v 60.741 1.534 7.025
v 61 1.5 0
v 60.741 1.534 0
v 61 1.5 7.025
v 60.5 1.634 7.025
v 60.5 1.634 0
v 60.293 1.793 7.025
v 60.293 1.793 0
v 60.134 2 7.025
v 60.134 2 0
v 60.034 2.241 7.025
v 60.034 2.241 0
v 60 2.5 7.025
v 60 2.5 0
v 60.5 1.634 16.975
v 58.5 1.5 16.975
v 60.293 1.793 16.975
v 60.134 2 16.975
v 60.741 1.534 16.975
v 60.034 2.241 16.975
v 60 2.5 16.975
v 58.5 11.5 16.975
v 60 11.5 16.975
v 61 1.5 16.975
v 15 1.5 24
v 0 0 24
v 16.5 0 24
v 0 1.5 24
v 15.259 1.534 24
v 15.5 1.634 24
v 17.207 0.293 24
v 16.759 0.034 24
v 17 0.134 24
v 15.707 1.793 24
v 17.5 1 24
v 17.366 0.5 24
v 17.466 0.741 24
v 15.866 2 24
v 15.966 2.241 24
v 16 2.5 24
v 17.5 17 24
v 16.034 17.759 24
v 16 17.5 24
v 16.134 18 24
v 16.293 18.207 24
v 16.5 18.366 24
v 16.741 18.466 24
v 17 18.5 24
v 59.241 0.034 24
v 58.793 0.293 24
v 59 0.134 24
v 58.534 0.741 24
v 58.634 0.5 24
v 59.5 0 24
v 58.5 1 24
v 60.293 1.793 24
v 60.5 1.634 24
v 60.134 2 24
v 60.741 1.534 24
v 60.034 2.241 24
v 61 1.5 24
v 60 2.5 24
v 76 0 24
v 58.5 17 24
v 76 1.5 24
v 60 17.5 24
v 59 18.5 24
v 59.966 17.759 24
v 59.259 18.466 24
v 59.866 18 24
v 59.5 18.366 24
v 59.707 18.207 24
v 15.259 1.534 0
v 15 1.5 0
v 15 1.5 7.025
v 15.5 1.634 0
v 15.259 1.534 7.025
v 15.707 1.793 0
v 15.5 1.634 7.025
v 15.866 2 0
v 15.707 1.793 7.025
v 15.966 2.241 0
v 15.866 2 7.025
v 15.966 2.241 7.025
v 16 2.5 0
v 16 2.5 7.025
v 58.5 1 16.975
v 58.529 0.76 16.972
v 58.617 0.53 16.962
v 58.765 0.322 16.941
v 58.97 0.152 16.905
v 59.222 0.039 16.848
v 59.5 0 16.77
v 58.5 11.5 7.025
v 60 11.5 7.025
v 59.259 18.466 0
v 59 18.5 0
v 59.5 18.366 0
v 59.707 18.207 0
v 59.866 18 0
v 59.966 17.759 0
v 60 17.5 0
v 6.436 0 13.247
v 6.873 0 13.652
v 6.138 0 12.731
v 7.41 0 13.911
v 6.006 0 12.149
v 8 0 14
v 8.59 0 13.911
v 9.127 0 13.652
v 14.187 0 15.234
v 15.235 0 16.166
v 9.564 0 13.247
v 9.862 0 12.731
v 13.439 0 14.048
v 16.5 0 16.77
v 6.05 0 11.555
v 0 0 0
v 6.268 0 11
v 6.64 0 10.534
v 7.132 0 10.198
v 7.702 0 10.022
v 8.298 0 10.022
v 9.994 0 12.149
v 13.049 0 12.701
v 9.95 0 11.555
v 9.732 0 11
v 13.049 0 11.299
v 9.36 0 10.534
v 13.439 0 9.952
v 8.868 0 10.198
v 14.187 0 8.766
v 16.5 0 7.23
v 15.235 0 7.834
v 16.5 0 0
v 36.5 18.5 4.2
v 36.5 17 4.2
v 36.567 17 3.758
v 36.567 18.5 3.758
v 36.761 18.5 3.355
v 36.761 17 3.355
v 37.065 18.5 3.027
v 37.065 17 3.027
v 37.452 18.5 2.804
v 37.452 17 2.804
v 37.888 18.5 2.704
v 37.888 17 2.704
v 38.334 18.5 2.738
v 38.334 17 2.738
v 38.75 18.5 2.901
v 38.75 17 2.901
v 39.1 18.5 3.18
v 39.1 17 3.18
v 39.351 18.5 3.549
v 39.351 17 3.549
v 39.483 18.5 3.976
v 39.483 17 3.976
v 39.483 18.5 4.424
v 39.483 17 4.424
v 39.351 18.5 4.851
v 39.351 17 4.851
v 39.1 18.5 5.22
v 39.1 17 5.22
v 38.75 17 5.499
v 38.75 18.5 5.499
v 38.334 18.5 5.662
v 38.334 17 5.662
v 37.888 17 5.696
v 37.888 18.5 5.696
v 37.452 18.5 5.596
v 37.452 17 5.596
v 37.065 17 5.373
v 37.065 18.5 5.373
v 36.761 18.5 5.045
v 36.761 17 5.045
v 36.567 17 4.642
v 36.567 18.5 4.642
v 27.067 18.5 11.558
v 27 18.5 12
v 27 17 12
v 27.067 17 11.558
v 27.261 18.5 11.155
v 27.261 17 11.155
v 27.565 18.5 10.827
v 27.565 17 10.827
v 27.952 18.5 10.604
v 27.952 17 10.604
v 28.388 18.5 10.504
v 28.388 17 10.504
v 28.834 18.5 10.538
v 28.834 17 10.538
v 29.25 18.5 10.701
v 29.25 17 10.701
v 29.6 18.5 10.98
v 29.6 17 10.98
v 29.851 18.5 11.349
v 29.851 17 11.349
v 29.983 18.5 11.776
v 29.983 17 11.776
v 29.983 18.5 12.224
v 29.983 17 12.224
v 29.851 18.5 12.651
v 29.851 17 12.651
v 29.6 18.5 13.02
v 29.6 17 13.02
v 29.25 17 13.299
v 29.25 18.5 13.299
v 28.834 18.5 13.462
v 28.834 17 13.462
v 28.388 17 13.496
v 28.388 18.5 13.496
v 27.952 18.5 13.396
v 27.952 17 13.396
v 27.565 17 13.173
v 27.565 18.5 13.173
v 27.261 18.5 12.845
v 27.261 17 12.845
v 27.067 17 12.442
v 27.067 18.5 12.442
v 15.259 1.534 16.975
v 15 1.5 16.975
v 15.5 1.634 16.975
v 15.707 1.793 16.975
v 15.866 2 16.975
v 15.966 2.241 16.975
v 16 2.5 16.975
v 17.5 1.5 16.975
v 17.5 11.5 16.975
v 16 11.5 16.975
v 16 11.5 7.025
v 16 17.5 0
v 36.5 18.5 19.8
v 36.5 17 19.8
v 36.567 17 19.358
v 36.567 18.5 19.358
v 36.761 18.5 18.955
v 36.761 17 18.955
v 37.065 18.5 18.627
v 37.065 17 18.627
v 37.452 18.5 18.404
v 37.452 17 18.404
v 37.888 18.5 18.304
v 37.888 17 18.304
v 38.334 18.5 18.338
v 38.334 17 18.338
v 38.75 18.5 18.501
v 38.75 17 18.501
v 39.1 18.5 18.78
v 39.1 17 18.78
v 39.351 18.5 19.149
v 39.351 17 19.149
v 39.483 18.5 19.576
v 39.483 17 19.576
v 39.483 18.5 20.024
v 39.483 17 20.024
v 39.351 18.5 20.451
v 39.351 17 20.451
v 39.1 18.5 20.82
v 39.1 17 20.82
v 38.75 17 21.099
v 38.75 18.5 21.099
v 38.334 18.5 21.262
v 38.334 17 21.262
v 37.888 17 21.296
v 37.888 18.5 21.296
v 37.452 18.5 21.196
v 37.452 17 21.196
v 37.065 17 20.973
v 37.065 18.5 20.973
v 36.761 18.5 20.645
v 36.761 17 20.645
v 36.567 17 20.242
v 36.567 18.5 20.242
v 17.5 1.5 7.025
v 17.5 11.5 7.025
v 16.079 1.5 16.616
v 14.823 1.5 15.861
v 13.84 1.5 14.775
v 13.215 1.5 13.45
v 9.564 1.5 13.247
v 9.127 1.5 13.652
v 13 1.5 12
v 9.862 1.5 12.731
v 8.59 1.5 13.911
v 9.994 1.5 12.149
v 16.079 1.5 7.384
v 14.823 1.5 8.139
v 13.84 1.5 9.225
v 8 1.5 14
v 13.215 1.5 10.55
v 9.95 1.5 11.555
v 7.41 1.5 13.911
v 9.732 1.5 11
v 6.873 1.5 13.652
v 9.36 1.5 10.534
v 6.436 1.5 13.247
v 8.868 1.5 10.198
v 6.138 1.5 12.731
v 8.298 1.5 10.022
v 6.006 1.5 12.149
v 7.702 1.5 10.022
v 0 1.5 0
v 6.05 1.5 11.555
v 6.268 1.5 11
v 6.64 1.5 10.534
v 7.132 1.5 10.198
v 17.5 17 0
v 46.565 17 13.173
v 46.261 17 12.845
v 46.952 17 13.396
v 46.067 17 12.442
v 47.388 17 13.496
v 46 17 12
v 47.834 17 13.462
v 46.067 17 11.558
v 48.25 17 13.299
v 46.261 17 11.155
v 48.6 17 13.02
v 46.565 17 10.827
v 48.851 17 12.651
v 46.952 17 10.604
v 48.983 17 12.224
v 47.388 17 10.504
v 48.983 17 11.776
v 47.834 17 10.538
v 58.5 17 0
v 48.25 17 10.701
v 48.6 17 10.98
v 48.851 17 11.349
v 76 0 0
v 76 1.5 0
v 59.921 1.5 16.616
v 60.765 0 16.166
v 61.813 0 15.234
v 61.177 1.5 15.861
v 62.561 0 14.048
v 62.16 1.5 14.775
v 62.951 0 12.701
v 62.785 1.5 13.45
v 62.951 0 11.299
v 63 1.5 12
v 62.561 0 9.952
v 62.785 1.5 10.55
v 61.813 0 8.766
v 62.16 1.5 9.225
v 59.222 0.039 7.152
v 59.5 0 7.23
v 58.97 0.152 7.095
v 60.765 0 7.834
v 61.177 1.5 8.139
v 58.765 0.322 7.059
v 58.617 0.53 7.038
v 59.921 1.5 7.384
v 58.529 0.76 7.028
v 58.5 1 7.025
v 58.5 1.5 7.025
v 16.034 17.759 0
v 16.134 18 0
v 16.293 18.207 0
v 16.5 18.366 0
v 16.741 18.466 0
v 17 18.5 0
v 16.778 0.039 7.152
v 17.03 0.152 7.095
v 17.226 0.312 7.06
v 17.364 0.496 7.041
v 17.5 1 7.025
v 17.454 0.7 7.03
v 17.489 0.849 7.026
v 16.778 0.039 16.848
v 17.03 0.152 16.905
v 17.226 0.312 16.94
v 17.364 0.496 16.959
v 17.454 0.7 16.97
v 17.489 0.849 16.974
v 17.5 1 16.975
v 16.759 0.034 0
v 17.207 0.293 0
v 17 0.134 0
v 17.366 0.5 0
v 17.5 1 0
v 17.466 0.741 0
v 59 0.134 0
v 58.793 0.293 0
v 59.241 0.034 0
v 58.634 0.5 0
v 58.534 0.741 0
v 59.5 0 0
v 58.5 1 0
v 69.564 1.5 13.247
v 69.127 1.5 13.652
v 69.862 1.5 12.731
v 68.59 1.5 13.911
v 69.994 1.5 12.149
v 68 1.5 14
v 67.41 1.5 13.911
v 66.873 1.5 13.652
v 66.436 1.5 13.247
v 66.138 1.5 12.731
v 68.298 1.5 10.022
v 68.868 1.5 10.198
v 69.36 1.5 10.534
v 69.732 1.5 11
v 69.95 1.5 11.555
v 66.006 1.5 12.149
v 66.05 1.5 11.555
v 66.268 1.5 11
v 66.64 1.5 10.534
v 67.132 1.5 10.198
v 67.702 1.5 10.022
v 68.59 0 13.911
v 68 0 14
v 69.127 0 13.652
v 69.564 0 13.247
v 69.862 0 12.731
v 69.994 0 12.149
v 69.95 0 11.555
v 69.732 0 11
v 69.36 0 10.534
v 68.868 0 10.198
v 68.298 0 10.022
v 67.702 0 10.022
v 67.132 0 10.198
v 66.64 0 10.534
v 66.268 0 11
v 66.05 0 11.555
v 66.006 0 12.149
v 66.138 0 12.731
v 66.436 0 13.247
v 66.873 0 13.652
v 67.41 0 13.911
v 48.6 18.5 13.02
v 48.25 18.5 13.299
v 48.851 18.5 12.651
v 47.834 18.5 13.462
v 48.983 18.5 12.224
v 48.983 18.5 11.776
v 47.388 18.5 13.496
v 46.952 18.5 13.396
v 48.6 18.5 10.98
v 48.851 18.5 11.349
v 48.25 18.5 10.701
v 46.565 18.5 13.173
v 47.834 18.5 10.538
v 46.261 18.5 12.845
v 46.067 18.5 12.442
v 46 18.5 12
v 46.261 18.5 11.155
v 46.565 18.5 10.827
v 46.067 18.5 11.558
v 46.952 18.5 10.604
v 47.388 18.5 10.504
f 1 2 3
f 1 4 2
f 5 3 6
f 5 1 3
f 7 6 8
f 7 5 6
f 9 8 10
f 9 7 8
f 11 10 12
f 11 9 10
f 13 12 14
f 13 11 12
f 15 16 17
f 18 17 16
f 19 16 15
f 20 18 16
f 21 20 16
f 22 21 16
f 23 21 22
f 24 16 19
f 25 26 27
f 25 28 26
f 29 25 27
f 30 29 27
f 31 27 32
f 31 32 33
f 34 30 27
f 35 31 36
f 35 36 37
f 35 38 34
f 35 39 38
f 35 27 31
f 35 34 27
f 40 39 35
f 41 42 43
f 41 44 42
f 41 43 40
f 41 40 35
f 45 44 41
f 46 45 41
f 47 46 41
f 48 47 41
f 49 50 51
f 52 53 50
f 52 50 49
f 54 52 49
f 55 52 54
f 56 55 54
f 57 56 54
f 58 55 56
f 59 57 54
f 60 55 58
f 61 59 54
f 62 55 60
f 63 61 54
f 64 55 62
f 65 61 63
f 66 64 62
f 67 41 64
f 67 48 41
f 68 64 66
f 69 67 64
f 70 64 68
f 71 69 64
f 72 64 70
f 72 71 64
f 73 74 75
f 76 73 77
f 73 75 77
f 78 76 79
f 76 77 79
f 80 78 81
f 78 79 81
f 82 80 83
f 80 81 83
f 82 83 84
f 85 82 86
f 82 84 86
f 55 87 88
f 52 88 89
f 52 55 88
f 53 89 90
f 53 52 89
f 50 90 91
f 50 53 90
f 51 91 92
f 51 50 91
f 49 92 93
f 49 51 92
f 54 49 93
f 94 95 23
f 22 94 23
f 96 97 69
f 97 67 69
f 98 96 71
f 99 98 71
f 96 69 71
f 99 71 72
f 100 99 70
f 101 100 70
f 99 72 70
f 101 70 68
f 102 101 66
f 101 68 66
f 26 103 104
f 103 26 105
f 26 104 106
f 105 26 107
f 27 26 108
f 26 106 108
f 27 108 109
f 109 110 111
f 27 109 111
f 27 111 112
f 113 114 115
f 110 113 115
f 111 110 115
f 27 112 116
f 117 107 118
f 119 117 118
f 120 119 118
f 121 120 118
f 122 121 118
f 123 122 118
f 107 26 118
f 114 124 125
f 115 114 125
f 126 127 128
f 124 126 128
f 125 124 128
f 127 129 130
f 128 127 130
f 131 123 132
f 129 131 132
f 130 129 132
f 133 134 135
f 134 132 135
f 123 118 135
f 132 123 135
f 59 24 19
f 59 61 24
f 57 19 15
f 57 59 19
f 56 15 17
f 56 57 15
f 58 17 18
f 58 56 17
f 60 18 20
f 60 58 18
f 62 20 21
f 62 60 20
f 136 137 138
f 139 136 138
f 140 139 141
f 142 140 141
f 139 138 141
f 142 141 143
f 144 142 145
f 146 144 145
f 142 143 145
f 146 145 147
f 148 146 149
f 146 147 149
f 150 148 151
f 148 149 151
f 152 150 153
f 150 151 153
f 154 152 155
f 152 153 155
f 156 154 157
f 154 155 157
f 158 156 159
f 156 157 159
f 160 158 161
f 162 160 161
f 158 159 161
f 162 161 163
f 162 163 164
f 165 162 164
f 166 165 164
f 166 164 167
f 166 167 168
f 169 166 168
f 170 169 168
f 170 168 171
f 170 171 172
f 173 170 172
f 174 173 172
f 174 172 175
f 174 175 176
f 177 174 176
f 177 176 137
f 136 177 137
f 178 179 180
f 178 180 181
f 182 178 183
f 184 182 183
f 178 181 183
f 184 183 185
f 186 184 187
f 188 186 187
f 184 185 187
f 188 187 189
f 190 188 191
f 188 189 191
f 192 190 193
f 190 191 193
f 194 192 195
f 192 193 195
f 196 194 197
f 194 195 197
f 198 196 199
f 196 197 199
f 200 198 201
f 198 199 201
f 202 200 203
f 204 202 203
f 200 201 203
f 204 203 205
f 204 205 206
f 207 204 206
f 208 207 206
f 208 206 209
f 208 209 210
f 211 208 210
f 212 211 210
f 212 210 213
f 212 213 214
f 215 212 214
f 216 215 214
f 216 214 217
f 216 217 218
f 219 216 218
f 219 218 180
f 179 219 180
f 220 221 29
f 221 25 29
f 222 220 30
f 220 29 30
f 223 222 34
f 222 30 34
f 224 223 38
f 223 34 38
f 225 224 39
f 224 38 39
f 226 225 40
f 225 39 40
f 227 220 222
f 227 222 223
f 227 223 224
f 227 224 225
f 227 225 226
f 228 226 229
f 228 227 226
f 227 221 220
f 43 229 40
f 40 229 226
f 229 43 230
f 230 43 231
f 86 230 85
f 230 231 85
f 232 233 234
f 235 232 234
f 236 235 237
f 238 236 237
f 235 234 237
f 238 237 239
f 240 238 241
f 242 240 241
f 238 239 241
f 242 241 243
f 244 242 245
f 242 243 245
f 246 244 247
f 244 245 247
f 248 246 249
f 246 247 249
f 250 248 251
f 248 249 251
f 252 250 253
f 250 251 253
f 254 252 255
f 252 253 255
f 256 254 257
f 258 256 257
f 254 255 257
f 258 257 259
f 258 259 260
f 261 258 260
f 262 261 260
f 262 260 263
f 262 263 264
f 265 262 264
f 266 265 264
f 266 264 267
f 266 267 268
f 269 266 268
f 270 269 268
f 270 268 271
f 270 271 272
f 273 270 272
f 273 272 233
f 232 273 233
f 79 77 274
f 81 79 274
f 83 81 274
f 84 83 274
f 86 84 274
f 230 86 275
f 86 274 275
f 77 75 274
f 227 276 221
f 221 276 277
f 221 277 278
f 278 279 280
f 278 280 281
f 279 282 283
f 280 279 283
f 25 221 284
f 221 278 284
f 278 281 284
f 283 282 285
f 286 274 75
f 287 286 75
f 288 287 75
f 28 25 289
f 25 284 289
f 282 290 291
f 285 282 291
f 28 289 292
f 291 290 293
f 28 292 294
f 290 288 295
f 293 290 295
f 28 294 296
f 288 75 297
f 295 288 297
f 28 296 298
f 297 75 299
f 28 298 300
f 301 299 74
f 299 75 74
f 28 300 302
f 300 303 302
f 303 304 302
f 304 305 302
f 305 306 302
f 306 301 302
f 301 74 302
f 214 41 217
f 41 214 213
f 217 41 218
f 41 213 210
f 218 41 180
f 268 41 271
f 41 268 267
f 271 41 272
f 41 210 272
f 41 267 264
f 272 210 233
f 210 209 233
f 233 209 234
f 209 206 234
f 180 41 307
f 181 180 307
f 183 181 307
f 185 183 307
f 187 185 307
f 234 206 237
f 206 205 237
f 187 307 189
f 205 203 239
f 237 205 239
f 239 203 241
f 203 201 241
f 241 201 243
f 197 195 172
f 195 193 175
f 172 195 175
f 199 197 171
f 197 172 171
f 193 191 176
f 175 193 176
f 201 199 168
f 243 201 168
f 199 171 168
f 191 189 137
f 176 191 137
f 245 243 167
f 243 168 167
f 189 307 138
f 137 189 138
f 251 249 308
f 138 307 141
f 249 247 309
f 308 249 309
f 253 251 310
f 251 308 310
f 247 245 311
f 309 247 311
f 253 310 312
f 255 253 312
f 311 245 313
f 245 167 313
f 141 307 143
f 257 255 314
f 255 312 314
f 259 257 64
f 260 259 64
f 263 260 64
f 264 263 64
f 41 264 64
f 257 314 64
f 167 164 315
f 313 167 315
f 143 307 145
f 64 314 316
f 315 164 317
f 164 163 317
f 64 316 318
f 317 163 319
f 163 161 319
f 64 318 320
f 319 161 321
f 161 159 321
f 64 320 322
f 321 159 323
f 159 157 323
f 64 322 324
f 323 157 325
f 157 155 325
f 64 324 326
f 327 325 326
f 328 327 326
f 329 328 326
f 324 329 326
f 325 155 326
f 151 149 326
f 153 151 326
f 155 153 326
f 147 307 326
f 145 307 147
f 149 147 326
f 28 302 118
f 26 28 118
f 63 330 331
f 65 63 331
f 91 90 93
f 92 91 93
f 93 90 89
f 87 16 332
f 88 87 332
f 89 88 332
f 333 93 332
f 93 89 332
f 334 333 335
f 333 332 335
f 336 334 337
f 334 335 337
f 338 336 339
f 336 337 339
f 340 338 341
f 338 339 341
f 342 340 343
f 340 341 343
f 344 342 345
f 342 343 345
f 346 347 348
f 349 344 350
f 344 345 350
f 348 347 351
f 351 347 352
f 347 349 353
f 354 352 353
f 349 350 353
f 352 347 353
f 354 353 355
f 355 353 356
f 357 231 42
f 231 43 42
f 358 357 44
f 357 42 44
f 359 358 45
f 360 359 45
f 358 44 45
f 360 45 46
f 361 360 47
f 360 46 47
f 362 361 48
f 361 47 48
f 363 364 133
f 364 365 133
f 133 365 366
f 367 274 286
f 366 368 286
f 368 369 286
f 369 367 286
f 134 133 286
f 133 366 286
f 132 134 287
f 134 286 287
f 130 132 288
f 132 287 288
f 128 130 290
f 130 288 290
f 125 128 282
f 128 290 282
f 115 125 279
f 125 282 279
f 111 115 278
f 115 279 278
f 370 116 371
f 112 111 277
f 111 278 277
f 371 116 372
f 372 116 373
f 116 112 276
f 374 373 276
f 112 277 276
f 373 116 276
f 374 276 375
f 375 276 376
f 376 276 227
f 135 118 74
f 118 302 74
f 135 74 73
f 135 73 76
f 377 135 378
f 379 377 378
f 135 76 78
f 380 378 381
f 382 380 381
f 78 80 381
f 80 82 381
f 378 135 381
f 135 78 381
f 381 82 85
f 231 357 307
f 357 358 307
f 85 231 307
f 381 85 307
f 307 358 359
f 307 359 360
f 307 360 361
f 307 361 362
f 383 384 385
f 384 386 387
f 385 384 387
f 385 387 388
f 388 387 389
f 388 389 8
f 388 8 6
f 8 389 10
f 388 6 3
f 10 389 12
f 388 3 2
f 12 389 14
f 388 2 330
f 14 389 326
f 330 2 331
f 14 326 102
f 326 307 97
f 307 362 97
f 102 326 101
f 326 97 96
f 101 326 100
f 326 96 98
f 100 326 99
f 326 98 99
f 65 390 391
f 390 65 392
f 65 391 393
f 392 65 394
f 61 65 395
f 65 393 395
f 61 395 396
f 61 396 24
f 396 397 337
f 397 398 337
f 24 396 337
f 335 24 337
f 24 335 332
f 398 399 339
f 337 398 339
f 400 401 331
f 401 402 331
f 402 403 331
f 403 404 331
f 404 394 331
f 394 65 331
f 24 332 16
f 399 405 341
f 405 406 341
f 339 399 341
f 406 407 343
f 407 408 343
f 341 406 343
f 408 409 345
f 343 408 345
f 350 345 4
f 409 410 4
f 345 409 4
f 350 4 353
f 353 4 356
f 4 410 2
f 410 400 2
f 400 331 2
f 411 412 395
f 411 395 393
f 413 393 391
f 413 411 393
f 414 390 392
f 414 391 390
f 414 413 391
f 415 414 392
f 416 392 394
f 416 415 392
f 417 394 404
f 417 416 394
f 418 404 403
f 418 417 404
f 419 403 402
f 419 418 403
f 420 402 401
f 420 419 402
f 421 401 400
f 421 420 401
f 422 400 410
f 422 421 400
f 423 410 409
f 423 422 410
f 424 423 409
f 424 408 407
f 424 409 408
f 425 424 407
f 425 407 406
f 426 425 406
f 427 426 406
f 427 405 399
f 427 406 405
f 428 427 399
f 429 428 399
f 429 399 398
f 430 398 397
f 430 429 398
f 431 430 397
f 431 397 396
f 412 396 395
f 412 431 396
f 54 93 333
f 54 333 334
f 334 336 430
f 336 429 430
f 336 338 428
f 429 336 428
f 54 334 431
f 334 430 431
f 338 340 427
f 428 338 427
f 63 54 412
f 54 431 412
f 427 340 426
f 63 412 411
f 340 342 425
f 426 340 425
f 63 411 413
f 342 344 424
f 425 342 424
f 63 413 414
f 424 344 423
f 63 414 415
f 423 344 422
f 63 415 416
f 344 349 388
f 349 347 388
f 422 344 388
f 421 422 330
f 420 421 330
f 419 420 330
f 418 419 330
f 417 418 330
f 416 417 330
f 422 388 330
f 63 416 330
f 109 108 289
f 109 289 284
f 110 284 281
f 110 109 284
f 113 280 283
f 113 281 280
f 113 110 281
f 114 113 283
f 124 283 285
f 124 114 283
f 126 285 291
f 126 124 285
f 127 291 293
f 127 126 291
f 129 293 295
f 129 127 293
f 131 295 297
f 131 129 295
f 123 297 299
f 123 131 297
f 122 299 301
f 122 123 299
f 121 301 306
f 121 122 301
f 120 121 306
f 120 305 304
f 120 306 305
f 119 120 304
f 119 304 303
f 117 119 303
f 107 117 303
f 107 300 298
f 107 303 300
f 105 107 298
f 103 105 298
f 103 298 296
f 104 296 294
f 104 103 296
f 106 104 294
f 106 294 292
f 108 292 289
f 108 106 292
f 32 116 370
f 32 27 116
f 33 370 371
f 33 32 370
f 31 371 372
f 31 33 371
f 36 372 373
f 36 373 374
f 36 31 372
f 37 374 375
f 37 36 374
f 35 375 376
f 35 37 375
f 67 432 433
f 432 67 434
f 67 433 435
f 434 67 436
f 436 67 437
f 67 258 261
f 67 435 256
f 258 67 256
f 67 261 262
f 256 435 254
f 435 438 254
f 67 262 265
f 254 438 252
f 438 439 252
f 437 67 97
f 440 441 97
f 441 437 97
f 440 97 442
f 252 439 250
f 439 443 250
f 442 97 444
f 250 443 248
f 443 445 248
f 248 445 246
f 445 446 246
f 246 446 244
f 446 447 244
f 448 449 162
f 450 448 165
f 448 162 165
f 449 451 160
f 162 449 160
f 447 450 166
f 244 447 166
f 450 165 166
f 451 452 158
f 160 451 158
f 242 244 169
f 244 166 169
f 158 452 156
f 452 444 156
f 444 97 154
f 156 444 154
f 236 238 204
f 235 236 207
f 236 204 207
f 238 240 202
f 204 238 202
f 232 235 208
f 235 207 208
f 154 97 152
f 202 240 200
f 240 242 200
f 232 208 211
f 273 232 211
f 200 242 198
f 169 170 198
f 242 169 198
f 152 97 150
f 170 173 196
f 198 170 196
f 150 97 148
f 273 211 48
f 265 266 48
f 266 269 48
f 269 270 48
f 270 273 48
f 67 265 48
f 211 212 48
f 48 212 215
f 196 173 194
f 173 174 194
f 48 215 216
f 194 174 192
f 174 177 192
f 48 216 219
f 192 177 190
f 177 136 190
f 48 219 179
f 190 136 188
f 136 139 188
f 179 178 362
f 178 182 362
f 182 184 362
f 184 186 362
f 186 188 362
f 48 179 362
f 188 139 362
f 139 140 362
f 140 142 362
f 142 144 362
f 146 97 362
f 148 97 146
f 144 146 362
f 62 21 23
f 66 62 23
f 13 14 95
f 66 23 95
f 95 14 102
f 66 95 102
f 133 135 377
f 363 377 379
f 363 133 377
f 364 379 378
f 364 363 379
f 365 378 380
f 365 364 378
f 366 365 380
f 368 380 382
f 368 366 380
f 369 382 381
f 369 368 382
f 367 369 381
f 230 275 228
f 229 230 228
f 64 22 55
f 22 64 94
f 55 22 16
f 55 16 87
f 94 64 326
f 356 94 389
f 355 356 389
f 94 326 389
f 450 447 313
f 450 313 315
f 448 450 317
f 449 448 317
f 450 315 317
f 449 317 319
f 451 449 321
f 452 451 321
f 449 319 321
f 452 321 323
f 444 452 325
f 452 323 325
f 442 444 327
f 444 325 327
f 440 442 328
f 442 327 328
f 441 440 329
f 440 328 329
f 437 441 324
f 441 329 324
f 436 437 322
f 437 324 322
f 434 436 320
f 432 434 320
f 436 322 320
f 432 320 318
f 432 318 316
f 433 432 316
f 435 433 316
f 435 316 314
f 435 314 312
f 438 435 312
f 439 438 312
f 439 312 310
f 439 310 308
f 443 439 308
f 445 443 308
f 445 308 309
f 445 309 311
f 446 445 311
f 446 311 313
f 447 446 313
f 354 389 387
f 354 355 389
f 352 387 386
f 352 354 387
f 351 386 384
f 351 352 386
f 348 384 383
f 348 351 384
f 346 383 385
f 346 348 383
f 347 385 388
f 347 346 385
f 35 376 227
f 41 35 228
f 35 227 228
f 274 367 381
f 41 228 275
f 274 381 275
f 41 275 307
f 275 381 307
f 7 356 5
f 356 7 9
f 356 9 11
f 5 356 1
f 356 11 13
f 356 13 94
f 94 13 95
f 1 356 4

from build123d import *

# Parameters (mm, degrees)
BOSS_EXTRUDE2_DEPTH     = 24
CUT_EXTRUDE1_DEPTH      = 82.49233092751734
CUT_EXTRUDE1_DEPTH_BACK = 82.49233092751734
SKETCH17_R              = 1.9999999999999996
SKETCH17_R_2            = 1.9999999999999962
F_3_0MM_DOWEL_HOLE1_D   = 3
SKETCH22_R              = 5.000000000000001
SKETCH22_R_2            = 4.9999999999999964
CUT_EXTRUDE2_DEPTH      = 1.5
CUT_EXTRUDE3_DEPTH      = 68.21792915584354
CUT_EXTRUDE3_DEPTH_BACK = 68.21792915584354
SKETCH23_W              = 9.949874371066619
SKETCH23_H              = 10
FILLET1_R               = 1


with BuildPart() as part:
    # 3DSketch1 → Boss-Extrude2 (new body)
    with BuildSketch(Plane(origin=(0, 0, 0), x_dir=(0.9998052854172774, 0.01973299905428837, 0), z_dir=(-3e-17, -8.8e-16, 1))):
        Polygon((0, 0), (17.496592494802357, -0.34532748345004655), (17.832053478725257, 16.65136236864367), (58.82407018083363, 15.842309407417849), (58.48860919691073, -1.1543804446758696), (75.98520169171307, -1.499707928125916), (76.0148011902945, 2.2e-16), (60.01791662361808, 0.3157279848686118), (60.353377607540985, 17.312417836962325), (16.361945049180772, 18.180669795351015), (16.02648406525787, 1.1839799432573024), (0.02959949858143255, 1.4997079281259162), align=None)
    extrude(amount=BOSS_EXTRUDE2_DEPTH)

    # Sketch17 → Cut-Extrude1 (cut, two sides: drawn at the far end of the back side and taken through both)
    with BuildSketch(Plane(origin=(0, 1.5, 0), x_dir=(1, 0, 0), z_dir=(0, 1, 0)).offset(-CUT_EXTRUDE1_DEPTH_BACK)):
        with Locations(Location((8, -12.000000000000002, 0), (0, 0, 270))):
            Circle(SKETCH17_R)
        with Locations(Location((68, -12.000000000000002, 0), (0, 0, 270))):
            Circle(SKETCH17_R_2)
    extrude(amount=CUT_EXTRUDE1_DEPTH + CUT_EXTRUDE1_DEPTH_BACK, mode=Mode.SUBTRACT)

    # Ø3.0mm Dowel Hole1 (through all)
    with Locations(Plane(origin=(0, 18.5, 0), x_dir=(1, 0, 0), z_dir=(0, 1, 0))):
        with Locations((28.5, -12), (47.5, -12), (38, -19.8), (38, -4.2)):
            Hole(F_3_0MM_DOWEL_HOLE1_D / 2)

    # Sketch22 → Cut-Extrude2 (cut)
    with BuildSketch(Plane(origin=(0, 1.5, 0), x_dir=(1, 0, 0), z_dir=(0, 1, 0))):
        with Locations((17.999999999997943, -12.000000000000927)):
            Circle(SKETCH22_R)
        with Locations((58.00000000000207, -12.000000000000927)):
            Circle(SKETCH22_R_2)
    extrude(amount=-CUT_EXTRUDE2_DEPTH, mode=Mode.SUBTRACT)

    # Sketch23 → Cut-Extrude3 (cut, two sides: drawn at the far end of the back side and taken through both)
    with BuildSketch(Plane.ZY.offset(-16).offset(-CUT_EXTRUDE3_DEPTH_BACK)):
        with Locations((12.000000000000927, 6.5)):
            Rectangle(SKETCH23_W, SKETCH23_H)
    extrude(amount=CUT_EXTRUDE3_DEPTH + CUT_EXTRUDE3_DEPTH_BACK, mode=Mode.SUBTRACT)

    # Fillet1
    fillet1_edges = [part.edges().sort_by_distance(p)[0] for p in [
        (17.500000000000004, -3.09e-15, 3.5125314072338187),
        (17.500000000000004, -1.8e-14, 20.487468592767108),
        (58.50000000000001, -3.09e-15, 3.5125314072338214),
        (58.50000000000001, -1.8e-14, 20.487468592767108),
        (15.999999999999998, 18.49999999999999, 12.000000000000016),
        (60.000000000000014, 18.49999999999999, 12.000000000000018),
        (60.00000000000001, 1.49999999999998, 20.48746859276712),
        (60.00000000000001, 1.499999999999995, 3.512531407233811),
        (15.999999999999998, 1.4999999999999825, 20.48746859276712),
        (15.999999999999998, 1.4999999999999973, 3.5125314072338103),
    ]]
    fillet(fillet1_edges, radius=FILLET1_R)


solid = part.part
